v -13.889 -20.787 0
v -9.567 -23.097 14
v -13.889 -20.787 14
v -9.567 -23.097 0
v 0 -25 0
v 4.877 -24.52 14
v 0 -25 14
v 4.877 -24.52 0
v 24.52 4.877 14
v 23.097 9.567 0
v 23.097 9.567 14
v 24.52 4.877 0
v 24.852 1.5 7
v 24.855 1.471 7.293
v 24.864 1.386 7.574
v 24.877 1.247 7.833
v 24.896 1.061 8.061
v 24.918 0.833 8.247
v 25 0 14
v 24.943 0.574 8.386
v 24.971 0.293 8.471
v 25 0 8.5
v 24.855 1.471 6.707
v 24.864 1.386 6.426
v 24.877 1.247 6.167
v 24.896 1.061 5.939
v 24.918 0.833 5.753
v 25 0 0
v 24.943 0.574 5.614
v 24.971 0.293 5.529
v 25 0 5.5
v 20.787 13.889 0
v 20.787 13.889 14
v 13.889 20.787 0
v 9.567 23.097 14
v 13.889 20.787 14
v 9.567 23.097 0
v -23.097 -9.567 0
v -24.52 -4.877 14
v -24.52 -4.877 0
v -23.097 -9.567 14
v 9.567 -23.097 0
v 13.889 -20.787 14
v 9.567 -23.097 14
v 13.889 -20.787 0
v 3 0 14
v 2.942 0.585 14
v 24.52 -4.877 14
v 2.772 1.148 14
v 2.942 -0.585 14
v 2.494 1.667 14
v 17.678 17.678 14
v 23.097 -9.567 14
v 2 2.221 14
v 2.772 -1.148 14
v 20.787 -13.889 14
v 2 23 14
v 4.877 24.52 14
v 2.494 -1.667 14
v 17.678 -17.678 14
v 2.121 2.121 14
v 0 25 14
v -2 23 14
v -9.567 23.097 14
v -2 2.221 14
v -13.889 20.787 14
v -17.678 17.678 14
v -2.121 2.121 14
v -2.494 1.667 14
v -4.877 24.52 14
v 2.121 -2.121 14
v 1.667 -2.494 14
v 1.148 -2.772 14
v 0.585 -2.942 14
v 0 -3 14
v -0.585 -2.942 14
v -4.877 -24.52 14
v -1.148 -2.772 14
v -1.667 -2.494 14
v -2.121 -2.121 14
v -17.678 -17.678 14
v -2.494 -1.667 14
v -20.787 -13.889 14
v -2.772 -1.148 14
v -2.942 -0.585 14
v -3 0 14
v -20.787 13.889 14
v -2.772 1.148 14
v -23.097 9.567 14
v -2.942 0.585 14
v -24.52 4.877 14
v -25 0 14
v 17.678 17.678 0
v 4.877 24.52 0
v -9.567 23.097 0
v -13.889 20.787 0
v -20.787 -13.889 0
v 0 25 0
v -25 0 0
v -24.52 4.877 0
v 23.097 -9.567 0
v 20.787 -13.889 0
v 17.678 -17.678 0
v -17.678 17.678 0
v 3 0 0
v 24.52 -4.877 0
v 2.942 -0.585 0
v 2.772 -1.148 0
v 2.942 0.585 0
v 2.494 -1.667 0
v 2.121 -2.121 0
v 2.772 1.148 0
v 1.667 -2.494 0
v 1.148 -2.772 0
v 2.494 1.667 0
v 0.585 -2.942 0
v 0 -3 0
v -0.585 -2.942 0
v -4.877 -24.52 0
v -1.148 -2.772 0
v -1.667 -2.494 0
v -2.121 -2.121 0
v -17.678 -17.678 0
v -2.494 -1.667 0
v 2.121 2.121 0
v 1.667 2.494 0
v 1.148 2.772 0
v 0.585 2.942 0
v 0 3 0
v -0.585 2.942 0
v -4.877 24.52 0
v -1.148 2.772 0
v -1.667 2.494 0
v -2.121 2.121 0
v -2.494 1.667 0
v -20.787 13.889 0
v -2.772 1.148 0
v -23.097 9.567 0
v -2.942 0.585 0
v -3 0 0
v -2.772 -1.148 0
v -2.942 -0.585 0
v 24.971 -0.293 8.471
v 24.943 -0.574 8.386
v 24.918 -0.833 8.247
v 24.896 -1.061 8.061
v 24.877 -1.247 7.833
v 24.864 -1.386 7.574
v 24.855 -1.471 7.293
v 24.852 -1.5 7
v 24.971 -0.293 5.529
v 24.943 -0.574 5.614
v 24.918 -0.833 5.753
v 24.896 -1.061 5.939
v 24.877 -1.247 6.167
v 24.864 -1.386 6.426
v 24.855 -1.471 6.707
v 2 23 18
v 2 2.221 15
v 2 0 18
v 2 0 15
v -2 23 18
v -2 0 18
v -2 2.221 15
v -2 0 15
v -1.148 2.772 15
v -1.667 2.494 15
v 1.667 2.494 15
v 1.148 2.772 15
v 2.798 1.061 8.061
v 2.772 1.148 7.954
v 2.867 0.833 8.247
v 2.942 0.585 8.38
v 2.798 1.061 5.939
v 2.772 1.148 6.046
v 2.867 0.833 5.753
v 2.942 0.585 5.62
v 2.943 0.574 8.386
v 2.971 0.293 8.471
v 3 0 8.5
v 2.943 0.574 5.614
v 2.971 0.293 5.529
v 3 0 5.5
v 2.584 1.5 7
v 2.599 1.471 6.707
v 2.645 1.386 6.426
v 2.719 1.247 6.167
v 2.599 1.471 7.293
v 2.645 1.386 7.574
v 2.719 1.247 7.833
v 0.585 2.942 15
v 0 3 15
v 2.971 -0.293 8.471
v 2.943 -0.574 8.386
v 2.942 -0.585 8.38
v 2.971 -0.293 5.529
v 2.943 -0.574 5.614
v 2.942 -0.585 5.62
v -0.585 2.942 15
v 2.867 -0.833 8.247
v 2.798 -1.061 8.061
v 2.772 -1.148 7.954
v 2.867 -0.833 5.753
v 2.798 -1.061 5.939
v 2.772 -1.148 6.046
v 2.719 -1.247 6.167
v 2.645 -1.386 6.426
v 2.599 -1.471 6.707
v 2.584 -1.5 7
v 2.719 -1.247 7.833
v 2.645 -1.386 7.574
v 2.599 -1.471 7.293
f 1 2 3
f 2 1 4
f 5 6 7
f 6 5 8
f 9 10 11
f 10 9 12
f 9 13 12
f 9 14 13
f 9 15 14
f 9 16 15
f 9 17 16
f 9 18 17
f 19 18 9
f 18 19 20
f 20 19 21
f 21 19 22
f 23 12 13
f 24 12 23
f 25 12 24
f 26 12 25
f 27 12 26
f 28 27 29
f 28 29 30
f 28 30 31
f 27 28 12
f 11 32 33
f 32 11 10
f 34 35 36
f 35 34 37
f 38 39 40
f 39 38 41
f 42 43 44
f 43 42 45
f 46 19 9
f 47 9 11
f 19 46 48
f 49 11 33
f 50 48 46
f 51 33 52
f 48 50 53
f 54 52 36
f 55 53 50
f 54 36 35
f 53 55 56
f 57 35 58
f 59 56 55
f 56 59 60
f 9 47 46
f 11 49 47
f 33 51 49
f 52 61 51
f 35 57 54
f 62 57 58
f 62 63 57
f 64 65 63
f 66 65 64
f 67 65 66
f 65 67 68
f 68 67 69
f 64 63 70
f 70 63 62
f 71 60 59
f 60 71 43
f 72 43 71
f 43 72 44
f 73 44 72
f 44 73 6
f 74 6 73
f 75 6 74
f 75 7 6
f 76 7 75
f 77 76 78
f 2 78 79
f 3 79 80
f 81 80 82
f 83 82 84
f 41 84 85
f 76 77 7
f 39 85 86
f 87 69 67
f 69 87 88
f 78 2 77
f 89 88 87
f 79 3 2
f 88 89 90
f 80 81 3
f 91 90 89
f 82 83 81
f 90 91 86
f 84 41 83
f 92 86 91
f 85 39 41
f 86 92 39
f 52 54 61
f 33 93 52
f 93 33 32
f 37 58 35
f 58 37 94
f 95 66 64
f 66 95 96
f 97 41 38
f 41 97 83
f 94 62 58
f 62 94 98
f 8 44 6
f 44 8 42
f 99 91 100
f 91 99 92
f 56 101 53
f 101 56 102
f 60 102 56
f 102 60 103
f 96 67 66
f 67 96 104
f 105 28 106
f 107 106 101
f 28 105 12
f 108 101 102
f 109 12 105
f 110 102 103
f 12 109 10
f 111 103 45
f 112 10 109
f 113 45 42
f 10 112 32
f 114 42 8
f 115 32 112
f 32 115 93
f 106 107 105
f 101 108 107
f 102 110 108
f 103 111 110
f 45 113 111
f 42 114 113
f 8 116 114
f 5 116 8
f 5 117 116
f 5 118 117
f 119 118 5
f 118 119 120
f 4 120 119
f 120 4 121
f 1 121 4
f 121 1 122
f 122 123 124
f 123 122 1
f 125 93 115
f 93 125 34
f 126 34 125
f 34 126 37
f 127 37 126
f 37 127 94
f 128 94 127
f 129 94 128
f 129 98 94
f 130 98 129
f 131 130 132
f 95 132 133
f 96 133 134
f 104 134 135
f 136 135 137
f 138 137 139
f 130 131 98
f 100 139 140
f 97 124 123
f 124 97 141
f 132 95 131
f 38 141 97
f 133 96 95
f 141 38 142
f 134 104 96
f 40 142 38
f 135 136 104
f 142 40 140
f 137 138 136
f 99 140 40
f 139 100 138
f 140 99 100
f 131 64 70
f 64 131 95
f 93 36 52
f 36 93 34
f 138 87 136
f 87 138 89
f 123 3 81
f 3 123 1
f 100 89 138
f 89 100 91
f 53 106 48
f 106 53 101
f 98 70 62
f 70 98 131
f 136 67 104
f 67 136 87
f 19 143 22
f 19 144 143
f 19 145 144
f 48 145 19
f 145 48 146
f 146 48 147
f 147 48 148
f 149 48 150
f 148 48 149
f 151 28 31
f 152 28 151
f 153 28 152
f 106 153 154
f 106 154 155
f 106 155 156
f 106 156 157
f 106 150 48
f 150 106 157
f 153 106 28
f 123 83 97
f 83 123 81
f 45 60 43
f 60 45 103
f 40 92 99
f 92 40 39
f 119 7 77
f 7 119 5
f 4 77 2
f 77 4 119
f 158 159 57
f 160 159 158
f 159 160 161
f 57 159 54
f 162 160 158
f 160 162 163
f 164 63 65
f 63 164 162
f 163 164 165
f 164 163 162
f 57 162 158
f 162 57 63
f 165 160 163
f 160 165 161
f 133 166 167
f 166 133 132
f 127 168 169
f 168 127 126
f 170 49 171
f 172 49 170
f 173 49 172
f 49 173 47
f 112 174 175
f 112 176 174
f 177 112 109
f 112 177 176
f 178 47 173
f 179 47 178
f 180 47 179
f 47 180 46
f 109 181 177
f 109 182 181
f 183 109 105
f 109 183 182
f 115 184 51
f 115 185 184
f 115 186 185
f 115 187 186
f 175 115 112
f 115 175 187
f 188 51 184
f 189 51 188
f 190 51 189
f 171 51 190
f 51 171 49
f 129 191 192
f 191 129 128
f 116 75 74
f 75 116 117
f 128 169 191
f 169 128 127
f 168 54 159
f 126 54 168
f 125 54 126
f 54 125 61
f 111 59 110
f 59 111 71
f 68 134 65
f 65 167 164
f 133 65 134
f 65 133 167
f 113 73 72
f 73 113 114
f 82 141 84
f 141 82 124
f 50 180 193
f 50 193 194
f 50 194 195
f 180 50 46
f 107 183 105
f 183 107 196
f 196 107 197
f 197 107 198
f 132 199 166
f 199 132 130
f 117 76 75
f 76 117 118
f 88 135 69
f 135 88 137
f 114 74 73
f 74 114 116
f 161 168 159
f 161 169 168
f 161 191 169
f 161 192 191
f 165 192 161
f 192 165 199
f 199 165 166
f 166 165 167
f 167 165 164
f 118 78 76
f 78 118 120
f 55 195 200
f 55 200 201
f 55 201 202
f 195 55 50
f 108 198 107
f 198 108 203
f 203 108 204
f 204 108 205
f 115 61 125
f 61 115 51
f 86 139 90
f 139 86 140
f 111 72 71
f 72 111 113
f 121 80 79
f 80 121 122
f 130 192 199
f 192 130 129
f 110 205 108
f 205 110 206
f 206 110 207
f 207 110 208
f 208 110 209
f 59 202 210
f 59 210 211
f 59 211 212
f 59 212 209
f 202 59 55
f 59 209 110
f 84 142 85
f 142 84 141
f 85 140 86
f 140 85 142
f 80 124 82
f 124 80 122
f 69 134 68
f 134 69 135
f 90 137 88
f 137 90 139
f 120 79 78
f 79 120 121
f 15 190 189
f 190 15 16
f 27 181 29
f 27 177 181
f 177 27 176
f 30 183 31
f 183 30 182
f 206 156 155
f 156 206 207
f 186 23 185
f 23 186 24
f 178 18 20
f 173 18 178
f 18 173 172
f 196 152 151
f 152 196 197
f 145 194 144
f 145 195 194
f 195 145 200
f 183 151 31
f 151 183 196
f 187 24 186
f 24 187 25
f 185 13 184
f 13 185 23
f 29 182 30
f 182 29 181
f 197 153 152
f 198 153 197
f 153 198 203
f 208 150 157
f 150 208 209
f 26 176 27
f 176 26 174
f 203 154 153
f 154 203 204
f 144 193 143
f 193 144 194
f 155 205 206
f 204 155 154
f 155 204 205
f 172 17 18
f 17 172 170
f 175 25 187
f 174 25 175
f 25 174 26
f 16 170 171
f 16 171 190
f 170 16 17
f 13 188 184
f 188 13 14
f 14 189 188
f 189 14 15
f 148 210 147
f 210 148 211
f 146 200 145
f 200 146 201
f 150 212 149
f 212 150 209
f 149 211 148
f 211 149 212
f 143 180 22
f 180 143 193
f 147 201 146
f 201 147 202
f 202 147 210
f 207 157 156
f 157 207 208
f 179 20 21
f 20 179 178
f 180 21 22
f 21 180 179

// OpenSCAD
$fn = 32;

// ----------------------------------------------------------------------
// Control knob: pointer knob
// ----------------------------------------------------------------------

// --- parameters (mm) ---
rib_w = 4;                // pointer rib width
rib_h = 5;                // pointer rib height
knob_d = 50;              // knob body diameter
knob_h = 14;              // knob body height
bore_d = 6;               // shaft bore diameter
set_d = 3;                // set screw bore diameter

rib_poke = rib_h - 1;  // rib height above the top
total_h = knob_h + rib_h - 1;  // overall height

difference() {
  union() {
    cylinder(h = knob_h, d = knob_d);
    translate([-rib_w / 2, 0, knob_h - 1])
      cube([rib_w, knob_d / 2 - 2, rib_h]);
  }
  translate([0, 0, -1]) cylinder(h = knob_h + 2, d = bore_d);
  translate([-1, 0, knob_h / 2]) rotate([0, 90, 0])
    cylinder(h = knob_d / 2 + bore_d / 2 + 2, d = set_d);}
